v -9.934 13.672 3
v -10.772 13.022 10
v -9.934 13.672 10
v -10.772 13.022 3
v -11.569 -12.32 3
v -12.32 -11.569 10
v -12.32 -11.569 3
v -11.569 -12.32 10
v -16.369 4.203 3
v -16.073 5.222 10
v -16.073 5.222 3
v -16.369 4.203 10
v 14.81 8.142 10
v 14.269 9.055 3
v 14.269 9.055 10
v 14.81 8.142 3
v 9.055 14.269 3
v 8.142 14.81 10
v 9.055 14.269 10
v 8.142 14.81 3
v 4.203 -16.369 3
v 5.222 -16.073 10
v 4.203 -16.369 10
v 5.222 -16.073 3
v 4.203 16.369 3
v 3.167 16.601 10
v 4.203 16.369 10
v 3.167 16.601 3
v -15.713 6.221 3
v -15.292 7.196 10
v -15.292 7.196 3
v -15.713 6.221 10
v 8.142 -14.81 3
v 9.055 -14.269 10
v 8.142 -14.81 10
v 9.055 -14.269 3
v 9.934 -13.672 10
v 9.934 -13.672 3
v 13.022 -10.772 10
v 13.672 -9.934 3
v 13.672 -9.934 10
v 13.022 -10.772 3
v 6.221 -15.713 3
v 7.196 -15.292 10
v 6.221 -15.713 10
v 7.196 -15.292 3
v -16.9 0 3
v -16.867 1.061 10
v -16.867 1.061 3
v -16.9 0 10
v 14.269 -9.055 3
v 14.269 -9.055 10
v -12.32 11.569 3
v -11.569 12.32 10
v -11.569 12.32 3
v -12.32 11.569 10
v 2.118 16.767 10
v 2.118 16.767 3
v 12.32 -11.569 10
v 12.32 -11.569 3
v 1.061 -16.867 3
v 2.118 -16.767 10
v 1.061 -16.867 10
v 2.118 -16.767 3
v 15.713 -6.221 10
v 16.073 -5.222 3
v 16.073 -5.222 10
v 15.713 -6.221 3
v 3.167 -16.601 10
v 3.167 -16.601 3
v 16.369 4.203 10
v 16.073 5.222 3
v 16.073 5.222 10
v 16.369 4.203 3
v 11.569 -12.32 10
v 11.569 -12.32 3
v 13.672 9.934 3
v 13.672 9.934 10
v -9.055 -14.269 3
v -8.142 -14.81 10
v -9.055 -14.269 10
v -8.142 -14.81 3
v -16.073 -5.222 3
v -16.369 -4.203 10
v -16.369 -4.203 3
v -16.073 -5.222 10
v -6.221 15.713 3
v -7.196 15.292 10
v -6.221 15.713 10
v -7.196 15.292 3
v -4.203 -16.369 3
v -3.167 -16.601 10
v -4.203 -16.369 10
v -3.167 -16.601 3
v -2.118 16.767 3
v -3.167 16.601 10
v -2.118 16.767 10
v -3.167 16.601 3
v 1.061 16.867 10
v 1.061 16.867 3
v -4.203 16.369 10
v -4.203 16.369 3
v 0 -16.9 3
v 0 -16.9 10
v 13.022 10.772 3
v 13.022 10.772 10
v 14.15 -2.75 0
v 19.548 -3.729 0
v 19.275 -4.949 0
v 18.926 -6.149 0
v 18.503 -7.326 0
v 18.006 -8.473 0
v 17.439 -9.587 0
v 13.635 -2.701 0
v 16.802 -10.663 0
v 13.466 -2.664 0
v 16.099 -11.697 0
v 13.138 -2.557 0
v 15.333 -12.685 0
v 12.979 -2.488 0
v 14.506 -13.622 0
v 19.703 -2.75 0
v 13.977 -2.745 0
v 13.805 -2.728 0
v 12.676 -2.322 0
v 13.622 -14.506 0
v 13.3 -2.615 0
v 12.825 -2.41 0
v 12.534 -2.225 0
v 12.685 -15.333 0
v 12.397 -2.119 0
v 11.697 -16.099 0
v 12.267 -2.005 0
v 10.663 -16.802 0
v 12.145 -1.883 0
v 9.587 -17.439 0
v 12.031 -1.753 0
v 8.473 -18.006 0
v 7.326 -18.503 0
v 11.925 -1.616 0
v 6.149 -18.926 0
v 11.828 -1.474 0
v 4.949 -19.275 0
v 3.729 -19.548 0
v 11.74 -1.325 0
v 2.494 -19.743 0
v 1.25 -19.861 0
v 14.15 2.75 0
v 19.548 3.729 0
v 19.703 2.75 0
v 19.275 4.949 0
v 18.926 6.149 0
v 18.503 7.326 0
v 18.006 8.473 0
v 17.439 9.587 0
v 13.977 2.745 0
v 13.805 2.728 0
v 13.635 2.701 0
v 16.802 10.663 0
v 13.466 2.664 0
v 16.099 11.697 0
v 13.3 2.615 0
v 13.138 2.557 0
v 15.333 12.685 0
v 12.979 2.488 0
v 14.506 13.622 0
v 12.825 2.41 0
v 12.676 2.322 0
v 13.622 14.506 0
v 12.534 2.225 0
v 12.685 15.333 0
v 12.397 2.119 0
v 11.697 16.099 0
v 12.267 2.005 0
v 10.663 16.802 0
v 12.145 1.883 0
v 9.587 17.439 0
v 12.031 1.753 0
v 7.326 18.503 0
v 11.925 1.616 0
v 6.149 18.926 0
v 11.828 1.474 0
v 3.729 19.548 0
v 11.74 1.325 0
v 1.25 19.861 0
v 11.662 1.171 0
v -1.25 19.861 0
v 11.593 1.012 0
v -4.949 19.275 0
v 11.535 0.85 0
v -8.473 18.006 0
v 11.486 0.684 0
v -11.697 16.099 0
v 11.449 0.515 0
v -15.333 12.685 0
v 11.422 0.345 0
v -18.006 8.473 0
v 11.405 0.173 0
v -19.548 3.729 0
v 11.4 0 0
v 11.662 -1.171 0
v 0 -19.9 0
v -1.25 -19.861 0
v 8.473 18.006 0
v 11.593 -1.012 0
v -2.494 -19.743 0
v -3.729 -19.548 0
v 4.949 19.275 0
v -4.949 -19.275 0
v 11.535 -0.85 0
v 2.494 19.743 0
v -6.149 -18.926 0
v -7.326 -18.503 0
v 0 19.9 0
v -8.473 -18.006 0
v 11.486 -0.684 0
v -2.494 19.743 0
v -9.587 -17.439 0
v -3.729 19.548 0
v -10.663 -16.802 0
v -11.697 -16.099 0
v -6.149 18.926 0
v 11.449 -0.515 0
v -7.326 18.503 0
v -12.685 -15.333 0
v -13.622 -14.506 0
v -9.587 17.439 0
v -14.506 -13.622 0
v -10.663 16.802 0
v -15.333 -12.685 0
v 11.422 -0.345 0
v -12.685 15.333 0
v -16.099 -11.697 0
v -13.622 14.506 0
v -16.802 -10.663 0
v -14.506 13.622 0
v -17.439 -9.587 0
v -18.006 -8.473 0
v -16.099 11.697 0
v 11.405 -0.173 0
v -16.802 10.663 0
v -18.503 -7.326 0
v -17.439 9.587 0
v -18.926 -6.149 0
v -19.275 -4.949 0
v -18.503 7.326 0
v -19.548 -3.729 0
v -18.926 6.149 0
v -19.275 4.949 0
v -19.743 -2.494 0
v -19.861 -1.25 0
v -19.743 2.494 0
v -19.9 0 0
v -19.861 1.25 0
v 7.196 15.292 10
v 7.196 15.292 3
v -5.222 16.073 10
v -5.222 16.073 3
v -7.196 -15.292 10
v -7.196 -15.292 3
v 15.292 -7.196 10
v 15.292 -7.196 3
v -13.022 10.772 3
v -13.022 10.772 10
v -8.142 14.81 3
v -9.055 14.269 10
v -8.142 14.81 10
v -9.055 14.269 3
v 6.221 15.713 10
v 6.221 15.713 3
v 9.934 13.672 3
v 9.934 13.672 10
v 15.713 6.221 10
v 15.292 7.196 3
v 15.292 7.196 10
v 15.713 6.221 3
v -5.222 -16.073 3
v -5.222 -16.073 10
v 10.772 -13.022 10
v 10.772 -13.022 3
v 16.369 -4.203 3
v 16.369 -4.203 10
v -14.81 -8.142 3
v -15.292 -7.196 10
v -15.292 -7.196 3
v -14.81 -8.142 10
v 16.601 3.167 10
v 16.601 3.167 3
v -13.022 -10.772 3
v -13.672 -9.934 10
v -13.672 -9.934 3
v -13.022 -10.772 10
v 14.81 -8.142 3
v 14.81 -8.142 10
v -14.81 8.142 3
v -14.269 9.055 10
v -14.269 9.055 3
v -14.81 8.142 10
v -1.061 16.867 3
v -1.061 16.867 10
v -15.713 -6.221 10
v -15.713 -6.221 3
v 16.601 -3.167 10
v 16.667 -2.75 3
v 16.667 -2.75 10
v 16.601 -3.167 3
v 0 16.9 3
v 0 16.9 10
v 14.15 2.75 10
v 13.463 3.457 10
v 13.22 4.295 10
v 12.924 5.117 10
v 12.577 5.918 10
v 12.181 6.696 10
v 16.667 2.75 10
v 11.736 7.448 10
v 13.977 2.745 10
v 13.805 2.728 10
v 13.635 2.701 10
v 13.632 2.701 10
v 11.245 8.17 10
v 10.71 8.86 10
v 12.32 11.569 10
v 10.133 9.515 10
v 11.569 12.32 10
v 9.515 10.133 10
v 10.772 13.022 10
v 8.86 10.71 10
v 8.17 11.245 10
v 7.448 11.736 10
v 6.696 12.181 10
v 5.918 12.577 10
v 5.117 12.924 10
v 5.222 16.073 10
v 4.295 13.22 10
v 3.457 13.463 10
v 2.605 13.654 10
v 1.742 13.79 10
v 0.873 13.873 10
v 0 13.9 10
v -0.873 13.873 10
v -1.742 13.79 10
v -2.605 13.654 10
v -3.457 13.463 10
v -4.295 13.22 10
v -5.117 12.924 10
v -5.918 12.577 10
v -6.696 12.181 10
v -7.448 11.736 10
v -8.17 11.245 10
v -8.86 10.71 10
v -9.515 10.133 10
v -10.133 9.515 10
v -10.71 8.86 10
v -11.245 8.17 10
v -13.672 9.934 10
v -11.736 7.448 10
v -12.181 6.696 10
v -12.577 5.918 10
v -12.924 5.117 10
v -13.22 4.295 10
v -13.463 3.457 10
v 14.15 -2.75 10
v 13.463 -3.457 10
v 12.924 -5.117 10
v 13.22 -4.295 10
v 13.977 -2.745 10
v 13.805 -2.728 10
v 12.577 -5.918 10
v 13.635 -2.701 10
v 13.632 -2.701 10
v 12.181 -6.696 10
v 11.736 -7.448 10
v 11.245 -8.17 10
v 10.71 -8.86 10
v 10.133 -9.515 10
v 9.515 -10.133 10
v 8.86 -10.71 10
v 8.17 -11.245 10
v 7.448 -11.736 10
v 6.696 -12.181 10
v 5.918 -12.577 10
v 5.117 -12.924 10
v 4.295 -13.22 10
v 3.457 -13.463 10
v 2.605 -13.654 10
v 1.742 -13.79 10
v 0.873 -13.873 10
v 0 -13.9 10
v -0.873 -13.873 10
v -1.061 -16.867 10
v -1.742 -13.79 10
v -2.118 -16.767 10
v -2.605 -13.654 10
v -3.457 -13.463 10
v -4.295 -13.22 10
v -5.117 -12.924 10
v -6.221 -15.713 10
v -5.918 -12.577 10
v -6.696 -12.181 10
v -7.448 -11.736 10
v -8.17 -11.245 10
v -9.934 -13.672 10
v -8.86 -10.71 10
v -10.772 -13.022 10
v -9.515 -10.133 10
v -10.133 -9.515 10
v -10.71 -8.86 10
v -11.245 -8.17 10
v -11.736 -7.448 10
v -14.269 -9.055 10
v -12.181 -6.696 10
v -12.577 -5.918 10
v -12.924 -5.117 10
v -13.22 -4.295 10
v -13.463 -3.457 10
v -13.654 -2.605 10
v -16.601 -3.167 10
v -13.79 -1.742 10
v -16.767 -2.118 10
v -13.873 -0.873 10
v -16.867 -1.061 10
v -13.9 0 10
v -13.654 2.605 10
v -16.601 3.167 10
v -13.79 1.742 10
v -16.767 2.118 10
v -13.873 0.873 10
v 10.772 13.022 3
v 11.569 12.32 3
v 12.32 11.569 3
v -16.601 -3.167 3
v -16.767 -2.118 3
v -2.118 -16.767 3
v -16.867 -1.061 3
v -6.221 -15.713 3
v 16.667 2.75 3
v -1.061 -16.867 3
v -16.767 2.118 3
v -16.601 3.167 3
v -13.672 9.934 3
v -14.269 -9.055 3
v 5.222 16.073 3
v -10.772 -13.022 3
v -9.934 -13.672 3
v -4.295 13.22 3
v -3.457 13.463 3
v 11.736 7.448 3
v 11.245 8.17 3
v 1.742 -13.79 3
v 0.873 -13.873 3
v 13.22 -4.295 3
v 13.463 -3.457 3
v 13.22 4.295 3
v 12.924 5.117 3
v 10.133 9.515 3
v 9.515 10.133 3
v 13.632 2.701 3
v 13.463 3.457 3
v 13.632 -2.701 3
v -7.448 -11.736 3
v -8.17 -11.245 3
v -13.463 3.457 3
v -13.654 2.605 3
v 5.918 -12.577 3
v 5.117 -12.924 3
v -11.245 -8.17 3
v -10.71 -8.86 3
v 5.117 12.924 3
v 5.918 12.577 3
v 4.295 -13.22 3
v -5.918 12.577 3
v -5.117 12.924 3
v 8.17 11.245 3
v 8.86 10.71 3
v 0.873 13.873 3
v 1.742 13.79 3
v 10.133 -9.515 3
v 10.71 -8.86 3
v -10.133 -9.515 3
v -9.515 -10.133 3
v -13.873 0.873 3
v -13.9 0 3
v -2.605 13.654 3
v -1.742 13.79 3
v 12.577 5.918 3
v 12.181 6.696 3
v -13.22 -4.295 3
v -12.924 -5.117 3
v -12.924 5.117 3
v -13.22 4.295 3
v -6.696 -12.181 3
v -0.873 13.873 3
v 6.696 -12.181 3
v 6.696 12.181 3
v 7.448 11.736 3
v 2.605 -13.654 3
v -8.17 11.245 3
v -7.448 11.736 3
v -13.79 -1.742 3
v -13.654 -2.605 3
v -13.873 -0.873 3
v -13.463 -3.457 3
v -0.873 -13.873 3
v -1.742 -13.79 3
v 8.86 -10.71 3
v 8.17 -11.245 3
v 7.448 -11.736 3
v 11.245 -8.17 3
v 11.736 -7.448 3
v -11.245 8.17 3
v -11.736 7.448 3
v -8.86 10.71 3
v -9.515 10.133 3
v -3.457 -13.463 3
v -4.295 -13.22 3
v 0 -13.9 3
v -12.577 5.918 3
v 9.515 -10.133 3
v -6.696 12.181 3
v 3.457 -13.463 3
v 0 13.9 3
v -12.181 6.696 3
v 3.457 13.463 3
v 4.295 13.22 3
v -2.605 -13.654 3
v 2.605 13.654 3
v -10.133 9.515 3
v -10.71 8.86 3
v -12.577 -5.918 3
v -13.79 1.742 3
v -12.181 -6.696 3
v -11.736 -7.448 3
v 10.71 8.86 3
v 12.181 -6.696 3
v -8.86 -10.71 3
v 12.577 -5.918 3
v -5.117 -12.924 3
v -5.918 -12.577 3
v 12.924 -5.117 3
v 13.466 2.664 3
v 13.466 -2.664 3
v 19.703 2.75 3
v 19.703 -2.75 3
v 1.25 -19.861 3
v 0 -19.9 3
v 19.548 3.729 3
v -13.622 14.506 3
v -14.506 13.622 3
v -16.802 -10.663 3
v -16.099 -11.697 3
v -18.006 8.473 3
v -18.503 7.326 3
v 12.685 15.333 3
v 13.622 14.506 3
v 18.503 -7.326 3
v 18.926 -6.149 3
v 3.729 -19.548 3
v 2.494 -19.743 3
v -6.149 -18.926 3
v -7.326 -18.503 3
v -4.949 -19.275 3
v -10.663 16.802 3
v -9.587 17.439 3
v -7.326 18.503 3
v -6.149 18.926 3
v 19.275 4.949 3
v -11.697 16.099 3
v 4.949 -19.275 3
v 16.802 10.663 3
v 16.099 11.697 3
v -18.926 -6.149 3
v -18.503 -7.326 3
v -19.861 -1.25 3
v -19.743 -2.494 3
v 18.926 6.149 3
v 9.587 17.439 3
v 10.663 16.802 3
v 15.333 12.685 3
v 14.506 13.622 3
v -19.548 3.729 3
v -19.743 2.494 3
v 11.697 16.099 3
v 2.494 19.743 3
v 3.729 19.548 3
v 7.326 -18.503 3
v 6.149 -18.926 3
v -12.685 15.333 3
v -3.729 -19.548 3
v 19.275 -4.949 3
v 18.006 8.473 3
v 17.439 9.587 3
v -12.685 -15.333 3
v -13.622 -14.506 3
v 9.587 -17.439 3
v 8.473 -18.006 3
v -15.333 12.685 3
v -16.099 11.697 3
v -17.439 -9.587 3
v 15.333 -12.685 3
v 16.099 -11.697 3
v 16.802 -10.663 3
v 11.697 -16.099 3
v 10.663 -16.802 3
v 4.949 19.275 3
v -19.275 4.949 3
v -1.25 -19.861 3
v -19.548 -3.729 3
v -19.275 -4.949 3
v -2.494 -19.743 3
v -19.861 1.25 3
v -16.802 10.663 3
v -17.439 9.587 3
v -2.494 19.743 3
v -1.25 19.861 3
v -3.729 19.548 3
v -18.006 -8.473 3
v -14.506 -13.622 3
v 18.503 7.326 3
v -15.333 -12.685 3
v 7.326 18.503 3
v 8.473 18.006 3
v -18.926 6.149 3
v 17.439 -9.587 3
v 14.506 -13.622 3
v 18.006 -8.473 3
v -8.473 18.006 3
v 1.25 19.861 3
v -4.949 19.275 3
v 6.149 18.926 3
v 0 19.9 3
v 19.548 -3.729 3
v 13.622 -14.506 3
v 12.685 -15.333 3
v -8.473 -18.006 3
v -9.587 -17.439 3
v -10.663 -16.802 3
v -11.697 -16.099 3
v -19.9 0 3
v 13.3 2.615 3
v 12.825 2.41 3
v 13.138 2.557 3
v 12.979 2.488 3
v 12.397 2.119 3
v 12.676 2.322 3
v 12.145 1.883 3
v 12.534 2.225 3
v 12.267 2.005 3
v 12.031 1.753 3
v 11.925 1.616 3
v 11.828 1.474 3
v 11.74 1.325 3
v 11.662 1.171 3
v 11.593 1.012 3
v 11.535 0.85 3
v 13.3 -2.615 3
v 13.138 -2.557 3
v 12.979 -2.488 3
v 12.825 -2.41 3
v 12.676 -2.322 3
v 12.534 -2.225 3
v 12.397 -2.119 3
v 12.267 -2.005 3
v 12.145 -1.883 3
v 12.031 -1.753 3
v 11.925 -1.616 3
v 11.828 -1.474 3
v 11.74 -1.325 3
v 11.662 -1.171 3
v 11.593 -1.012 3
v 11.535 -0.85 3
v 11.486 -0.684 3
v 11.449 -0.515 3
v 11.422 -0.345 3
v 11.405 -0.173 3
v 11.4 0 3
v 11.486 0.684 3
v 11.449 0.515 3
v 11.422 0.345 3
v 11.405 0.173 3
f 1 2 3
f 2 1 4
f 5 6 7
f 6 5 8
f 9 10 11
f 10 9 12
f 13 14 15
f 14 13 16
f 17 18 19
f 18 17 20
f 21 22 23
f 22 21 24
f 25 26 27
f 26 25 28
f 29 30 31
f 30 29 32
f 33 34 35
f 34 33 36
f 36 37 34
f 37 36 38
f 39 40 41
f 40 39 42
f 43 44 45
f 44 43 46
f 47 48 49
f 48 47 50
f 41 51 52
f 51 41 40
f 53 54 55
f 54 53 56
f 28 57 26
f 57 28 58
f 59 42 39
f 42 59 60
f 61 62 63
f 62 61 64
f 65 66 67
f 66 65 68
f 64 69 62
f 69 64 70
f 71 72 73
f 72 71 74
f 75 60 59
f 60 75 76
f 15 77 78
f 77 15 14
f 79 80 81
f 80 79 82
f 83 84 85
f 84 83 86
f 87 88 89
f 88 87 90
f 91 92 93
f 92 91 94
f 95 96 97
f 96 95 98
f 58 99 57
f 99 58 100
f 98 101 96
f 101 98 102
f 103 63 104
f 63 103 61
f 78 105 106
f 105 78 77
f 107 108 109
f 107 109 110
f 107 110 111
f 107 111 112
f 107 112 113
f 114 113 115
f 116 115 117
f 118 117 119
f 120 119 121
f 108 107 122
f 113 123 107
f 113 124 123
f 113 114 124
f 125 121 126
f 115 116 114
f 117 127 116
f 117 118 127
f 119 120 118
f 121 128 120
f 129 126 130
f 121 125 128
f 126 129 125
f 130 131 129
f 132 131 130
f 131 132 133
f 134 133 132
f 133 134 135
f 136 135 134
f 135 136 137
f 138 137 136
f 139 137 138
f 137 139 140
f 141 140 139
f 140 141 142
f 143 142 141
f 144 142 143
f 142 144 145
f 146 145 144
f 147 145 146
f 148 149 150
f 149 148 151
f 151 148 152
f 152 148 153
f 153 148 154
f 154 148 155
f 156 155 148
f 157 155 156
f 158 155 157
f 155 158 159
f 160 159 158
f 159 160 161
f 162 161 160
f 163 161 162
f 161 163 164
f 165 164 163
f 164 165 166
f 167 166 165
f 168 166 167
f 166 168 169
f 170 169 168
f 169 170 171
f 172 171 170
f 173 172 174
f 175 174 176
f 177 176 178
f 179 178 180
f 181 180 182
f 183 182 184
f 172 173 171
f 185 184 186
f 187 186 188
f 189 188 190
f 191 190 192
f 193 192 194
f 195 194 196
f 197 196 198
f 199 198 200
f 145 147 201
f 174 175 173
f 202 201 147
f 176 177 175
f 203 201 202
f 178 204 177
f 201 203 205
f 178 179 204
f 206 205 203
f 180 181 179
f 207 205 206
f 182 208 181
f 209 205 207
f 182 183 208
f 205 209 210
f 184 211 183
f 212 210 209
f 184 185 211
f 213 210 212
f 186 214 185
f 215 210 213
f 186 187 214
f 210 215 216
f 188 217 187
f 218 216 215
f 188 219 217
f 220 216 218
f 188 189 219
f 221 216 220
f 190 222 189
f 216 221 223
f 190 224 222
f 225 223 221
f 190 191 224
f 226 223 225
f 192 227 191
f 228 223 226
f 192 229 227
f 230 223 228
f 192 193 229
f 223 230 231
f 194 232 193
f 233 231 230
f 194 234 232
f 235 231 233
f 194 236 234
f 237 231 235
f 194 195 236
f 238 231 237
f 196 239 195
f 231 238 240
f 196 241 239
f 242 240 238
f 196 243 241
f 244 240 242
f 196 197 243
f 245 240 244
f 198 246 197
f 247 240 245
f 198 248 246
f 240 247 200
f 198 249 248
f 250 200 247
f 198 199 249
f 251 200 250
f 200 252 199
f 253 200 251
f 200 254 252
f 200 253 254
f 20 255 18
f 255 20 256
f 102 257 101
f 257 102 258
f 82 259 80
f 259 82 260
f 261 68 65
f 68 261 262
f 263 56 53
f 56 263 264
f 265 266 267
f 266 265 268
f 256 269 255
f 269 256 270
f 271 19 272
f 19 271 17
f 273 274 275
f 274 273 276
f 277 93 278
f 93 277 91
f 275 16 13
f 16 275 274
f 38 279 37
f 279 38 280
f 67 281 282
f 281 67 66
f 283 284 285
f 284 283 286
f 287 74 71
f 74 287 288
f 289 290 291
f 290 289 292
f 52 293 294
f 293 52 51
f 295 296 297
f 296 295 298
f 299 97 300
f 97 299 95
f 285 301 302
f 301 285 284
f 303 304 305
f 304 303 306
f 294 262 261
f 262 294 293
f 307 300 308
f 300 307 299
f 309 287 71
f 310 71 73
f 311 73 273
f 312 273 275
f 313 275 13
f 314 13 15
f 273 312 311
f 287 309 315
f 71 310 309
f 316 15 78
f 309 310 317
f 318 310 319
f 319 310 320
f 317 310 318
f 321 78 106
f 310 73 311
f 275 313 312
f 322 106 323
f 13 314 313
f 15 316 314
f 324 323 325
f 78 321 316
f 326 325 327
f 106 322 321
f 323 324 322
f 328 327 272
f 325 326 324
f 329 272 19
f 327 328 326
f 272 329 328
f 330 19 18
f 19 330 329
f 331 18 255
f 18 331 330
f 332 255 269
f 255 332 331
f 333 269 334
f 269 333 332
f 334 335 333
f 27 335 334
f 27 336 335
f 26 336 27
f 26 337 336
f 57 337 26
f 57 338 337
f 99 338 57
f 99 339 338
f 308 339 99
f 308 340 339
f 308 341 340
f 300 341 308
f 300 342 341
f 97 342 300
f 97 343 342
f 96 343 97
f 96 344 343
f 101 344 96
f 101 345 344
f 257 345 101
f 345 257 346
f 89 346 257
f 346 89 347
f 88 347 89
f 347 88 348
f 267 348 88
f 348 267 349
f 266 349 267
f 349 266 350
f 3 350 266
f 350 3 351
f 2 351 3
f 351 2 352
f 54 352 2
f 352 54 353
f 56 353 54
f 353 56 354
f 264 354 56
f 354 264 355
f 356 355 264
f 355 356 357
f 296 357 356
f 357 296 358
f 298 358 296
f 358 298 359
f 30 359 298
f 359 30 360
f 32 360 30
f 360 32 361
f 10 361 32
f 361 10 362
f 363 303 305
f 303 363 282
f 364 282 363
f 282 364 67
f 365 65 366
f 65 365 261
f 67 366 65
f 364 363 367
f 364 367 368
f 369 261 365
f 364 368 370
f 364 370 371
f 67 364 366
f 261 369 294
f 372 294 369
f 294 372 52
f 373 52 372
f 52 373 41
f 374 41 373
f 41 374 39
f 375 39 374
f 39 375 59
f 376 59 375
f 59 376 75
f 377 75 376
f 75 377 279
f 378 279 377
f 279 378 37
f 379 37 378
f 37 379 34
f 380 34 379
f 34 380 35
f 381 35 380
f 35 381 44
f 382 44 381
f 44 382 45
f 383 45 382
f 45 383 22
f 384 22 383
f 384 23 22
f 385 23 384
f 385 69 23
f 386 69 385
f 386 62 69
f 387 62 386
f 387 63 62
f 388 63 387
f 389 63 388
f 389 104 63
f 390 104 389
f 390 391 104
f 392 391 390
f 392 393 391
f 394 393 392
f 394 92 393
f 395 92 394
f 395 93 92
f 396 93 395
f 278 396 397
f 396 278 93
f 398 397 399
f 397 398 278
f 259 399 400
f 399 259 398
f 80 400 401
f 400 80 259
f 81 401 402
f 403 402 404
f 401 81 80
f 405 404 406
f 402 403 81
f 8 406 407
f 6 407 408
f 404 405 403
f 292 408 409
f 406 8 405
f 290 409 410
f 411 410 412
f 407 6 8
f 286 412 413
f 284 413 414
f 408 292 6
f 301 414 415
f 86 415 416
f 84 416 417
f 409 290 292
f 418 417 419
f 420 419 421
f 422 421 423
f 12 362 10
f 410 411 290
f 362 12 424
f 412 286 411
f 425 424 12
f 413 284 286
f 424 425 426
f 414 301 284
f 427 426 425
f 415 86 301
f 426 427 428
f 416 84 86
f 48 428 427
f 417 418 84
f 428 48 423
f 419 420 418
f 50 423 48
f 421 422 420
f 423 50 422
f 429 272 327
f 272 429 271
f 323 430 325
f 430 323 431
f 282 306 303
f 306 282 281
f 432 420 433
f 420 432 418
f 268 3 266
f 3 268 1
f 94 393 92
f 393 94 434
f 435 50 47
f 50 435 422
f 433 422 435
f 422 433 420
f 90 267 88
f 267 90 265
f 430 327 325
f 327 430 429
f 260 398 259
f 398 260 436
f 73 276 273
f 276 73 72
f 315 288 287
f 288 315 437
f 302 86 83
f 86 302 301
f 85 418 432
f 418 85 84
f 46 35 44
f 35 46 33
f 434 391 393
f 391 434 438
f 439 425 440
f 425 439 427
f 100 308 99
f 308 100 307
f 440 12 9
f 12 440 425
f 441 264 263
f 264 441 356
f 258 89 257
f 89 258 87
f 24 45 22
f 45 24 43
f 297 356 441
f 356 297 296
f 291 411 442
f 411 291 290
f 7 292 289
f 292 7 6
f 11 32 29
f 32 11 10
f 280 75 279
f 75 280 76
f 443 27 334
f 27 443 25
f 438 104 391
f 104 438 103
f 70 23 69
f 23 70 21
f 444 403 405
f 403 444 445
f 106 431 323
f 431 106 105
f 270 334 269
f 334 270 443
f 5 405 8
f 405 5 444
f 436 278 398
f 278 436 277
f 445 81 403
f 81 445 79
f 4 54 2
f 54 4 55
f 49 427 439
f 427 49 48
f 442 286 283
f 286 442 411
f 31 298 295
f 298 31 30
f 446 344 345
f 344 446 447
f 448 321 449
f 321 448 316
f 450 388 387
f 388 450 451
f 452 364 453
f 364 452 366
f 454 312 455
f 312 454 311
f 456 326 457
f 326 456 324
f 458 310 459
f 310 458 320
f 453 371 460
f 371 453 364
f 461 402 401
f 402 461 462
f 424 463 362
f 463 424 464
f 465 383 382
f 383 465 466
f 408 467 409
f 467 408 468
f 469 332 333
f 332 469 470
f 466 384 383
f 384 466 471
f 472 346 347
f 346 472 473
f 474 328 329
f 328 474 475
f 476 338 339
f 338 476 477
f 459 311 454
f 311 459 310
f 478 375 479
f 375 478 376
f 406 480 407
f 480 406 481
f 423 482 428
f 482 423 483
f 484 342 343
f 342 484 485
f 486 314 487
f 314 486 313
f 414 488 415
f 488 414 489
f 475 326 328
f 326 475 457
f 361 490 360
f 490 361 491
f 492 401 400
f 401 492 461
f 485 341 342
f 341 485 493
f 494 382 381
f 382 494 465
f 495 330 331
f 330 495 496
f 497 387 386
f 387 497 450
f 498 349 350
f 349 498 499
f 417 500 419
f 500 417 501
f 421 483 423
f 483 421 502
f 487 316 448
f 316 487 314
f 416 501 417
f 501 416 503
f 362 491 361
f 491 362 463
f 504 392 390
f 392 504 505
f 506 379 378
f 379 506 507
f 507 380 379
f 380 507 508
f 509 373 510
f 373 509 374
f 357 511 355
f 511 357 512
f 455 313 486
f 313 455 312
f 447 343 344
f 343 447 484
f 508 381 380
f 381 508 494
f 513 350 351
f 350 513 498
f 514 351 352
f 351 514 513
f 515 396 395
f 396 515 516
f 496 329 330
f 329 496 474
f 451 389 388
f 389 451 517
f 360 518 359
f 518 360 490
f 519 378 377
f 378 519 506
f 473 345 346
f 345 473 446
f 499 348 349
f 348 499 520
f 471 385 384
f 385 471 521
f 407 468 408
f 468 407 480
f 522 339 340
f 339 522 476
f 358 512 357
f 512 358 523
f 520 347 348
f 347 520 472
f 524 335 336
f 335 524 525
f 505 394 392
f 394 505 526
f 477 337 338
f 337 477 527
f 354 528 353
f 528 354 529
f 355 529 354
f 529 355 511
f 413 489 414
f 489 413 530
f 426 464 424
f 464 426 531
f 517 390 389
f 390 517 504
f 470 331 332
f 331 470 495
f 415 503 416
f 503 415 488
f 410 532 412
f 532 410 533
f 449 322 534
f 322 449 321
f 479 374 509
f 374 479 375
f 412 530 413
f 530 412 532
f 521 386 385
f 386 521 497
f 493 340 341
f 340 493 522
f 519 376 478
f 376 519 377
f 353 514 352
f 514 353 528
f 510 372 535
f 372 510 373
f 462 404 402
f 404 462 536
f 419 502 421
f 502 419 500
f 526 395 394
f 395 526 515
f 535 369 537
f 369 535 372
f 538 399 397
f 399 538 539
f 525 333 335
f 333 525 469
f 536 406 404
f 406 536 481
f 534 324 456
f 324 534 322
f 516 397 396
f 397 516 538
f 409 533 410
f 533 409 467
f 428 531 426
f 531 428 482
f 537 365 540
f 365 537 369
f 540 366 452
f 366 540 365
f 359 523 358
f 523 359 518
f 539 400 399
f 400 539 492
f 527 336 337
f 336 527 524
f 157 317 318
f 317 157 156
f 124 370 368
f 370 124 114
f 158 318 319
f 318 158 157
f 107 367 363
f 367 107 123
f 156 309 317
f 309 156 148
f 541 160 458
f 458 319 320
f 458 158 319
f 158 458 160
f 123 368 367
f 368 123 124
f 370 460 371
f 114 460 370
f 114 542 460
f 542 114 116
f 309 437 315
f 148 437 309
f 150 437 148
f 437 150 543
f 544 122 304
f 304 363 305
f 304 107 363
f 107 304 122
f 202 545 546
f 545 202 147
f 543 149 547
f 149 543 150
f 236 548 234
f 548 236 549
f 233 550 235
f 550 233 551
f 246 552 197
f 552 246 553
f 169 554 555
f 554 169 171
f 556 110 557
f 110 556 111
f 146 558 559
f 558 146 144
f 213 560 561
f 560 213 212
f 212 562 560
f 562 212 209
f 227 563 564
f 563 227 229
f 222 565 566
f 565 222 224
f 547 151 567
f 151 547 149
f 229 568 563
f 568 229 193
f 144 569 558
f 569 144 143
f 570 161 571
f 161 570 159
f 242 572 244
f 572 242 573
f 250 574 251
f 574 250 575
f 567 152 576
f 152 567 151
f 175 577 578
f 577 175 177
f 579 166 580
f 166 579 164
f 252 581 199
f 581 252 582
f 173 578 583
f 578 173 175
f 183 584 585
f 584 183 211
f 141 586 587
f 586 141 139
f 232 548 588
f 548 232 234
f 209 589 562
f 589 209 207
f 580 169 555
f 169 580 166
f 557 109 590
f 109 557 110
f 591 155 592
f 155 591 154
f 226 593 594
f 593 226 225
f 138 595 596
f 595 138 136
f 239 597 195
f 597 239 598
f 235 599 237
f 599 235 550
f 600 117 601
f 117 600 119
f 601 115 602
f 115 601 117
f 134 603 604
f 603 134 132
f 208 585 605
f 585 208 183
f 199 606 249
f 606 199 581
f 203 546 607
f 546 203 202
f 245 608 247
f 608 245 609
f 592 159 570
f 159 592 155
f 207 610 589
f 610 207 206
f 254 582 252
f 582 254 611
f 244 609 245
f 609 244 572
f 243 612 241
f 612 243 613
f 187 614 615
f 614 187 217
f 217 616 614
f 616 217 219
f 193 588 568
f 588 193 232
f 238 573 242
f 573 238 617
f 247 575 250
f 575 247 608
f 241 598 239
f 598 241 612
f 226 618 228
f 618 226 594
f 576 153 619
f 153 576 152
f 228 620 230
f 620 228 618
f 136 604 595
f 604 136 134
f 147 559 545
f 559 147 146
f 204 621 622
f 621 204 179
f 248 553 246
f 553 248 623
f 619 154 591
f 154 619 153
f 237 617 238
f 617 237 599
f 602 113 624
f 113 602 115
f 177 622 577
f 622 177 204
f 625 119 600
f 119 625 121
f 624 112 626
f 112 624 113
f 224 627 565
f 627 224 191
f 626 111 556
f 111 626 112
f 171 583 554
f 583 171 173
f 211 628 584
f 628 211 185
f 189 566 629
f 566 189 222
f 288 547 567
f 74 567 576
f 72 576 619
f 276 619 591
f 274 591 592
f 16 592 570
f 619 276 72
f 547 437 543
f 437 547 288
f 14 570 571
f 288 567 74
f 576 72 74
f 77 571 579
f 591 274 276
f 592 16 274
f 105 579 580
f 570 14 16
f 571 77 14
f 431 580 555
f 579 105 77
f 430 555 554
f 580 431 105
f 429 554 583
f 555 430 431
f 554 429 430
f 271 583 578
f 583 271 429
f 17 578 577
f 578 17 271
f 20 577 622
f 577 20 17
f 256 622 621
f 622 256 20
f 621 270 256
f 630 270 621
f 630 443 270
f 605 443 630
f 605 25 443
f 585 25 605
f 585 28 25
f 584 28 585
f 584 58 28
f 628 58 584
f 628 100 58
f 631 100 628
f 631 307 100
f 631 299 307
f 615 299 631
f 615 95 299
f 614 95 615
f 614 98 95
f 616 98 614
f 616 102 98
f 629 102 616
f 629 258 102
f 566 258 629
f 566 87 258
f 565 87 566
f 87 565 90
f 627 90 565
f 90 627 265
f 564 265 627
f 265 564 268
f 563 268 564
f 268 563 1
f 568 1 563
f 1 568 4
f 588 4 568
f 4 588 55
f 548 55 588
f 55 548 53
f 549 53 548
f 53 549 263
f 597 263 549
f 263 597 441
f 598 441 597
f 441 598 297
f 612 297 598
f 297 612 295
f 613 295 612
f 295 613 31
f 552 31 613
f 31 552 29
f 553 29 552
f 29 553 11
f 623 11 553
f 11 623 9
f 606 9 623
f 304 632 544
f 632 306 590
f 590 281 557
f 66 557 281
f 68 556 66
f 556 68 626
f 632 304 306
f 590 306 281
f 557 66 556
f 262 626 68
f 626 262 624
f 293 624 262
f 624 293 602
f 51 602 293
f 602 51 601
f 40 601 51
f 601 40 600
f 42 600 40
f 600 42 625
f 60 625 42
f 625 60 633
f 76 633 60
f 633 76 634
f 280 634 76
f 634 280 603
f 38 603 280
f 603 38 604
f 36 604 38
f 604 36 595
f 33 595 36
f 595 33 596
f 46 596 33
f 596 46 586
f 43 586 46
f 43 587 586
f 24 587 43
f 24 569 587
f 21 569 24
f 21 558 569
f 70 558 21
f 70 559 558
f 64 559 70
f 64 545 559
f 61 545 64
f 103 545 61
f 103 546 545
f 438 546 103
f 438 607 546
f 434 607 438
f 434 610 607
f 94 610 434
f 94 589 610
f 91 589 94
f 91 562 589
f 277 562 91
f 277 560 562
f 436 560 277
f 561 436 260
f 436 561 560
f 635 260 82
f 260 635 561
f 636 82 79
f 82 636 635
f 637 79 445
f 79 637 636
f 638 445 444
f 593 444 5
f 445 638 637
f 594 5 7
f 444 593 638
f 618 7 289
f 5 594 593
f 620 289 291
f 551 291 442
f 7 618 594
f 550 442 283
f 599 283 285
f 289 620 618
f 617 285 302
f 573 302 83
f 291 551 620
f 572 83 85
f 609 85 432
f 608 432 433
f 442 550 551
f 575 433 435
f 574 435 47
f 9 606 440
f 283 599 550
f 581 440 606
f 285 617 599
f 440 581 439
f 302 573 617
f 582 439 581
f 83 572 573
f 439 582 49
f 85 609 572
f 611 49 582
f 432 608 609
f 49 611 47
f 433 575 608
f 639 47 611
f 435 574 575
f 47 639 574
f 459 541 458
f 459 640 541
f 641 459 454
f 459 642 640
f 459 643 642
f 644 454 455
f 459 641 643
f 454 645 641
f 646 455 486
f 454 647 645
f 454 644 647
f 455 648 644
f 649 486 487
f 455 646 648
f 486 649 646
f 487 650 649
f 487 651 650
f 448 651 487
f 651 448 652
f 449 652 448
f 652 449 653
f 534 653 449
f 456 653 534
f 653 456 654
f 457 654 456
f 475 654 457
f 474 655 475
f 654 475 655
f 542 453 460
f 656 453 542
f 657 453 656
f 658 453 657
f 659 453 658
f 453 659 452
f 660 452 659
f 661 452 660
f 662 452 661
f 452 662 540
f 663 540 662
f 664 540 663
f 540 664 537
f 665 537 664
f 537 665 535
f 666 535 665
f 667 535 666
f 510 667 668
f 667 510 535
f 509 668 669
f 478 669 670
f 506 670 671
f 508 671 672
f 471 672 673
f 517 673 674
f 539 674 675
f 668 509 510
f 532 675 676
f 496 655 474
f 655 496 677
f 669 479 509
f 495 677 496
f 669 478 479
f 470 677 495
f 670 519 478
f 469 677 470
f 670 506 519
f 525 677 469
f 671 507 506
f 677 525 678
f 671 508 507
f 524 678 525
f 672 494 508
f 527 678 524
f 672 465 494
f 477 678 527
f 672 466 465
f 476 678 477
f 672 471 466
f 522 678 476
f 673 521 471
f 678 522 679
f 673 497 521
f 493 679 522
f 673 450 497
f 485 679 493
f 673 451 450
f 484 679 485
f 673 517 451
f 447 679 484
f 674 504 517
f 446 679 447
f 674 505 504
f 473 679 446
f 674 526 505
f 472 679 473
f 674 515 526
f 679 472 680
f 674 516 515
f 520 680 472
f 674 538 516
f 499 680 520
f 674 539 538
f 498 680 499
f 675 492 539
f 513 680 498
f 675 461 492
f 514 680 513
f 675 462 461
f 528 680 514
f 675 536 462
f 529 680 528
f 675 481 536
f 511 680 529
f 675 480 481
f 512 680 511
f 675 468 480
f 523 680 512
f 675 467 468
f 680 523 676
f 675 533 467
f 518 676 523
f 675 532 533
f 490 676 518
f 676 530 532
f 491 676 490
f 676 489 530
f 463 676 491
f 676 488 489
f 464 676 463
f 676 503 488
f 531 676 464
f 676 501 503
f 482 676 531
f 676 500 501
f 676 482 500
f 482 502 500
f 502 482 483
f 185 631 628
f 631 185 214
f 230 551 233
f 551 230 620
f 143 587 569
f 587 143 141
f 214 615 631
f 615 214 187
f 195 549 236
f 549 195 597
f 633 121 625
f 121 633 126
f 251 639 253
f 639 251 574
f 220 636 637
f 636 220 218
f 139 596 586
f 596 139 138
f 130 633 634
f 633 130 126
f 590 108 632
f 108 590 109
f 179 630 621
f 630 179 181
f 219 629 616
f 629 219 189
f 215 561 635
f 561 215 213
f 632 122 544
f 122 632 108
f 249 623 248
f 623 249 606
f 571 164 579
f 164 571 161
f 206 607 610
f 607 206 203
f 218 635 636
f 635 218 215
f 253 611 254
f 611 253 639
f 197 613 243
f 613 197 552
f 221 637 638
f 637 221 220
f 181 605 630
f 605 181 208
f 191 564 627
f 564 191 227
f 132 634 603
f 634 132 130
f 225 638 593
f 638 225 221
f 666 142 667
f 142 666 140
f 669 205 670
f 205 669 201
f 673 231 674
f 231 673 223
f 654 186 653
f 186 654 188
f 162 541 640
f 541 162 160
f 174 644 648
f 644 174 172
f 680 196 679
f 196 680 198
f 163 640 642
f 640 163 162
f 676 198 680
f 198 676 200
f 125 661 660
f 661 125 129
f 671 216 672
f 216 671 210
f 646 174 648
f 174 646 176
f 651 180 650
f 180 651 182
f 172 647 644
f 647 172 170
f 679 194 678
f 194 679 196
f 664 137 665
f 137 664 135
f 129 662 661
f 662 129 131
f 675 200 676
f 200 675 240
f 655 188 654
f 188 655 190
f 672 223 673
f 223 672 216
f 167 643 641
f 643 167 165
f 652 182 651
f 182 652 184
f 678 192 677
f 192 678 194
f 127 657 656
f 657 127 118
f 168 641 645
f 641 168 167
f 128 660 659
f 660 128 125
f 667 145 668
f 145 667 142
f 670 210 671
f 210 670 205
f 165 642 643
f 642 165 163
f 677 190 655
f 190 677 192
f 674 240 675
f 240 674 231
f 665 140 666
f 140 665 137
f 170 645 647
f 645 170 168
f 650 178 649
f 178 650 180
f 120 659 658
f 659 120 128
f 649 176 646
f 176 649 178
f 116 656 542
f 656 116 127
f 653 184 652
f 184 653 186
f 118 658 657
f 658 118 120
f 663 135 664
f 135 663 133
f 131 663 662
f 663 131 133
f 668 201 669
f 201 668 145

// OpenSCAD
// modular cable inlet plug
// adjust PR and CR to fit different fittings or pipe


//parameters
$fn=100;

PR=16.90;   //enter pvc pipe radius here (for standard 1" PVC, PR=16.90)
CR= 2.75;   //cable radius (voltaic CR=2.7)
    
// main body (ring) with cable pass-through    
difference(){
    cylinder(10,PR,PR); 
    cylinder(12,PR-3,PR-3);
    translate([PR-CR,0,-2]) cylinder(25,CR,CR);
    translate([PR-CR,-CR,-2])cube([13,CR*2,25]);
    }
    
// flange with same pass-through
difference(){
    cylinder(3,PR+3,PR+3); 
    translate([PR-CR,0,-2]) cylinder(25,CR,CR);
    translate([PR-CR,-CR,-2])cube([13,CR*2,25]);
    }
